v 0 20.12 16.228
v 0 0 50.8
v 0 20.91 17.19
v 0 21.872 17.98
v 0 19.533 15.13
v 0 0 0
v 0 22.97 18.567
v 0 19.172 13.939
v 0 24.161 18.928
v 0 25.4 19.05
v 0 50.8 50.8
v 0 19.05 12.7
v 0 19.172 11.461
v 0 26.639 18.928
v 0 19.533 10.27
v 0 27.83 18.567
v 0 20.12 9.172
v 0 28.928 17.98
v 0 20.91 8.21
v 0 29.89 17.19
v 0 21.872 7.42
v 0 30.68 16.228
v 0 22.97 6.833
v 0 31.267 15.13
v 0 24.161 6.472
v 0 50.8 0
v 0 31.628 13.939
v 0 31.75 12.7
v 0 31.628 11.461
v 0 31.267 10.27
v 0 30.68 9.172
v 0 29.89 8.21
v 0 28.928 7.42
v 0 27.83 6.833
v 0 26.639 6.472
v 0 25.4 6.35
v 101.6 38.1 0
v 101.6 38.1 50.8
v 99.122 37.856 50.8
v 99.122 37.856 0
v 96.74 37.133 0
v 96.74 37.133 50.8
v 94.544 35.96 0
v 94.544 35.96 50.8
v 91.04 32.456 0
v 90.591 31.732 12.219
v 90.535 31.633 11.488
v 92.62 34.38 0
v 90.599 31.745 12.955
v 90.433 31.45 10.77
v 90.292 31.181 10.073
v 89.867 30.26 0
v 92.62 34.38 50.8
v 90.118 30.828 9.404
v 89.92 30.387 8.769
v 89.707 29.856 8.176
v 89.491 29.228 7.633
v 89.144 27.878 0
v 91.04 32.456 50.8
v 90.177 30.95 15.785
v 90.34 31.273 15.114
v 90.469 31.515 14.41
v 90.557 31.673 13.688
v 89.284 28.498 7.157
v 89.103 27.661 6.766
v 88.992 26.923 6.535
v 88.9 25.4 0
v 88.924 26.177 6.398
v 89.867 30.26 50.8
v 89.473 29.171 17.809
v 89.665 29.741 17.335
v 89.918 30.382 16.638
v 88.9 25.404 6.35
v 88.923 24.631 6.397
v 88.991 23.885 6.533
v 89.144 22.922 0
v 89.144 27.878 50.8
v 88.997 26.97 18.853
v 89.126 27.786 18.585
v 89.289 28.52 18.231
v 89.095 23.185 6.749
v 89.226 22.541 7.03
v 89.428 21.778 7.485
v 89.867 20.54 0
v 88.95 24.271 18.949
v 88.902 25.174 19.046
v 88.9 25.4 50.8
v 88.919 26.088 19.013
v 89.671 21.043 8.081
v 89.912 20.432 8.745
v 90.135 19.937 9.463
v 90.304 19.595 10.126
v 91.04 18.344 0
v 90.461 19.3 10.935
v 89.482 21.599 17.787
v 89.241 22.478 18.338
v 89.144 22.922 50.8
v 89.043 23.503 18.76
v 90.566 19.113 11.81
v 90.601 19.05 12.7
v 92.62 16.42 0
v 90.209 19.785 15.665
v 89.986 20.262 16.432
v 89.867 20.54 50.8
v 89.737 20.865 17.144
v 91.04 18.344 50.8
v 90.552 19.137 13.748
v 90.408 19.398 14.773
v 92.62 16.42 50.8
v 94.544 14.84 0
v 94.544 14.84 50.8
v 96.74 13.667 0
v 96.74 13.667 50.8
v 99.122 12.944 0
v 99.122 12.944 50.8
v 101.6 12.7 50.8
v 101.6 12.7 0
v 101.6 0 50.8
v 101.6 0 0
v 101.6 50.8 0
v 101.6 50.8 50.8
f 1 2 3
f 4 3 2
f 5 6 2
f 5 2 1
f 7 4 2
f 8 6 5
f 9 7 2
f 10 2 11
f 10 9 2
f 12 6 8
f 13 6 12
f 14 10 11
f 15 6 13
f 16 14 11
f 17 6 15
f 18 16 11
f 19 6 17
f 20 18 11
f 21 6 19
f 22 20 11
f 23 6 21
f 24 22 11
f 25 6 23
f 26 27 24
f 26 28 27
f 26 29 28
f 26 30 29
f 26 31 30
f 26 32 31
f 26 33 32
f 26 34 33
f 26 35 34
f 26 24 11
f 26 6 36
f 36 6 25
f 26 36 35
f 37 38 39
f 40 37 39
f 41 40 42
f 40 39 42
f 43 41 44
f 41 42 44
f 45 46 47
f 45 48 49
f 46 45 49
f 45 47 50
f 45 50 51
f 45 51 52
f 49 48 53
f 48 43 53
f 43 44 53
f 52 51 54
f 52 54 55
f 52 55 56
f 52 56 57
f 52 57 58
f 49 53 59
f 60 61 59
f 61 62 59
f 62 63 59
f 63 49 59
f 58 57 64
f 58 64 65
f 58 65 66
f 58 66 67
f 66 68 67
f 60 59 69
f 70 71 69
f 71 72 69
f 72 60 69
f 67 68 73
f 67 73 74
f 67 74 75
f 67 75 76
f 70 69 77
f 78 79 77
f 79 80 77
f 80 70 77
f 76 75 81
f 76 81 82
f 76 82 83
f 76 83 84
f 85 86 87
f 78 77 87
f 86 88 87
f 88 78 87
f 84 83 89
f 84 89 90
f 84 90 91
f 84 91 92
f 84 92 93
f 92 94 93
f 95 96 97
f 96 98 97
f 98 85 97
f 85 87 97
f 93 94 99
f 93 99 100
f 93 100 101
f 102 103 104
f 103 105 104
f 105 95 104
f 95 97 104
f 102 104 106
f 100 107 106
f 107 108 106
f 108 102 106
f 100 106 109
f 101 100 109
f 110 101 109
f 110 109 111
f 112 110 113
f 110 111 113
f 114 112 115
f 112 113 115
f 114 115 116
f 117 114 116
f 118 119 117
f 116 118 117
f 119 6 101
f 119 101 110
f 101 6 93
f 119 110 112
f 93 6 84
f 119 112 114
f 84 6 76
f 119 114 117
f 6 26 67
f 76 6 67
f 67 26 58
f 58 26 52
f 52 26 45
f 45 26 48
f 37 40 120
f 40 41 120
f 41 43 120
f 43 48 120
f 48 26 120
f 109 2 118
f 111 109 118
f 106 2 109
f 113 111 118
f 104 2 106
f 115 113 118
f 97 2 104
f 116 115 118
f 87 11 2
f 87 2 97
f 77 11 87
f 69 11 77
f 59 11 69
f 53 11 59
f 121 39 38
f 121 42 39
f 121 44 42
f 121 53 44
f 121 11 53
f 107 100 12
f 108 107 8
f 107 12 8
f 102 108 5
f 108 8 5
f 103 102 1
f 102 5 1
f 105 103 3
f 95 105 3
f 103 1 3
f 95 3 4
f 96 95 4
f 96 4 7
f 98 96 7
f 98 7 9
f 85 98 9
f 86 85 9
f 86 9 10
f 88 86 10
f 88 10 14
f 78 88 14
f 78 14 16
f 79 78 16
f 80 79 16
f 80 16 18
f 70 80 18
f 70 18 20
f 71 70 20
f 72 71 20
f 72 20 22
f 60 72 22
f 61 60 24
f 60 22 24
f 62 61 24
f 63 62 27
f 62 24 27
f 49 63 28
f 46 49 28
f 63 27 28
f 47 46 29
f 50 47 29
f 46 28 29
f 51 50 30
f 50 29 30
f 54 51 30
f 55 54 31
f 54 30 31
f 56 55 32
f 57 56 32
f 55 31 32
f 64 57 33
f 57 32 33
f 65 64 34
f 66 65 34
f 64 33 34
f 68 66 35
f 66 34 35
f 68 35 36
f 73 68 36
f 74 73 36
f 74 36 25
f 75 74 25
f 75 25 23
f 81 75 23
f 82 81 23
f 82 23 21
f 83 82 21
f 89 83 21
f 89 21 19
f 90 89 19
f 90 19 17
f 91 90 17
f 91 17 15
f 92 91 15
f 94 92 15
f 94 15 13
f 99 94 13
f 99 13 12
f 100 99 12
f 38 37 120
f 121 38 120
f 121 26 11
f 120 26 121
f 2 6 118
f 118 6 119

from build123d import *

# Parameters (mm, degrees)
F0_W     = 101.6
F0_H     = 50.8
F1_DEPTH = 50.8
F3_DEPTH = 50.801
F4_R     = 6.35
F5_DEPTH = 101.601


with BuildPart() as f1:
    # F0 (on Top) → F1 (new body)
    with BuildSketch(Plane.XY):
        with Locations((50.8, 25.4)):
            Rectangle(F0_W, F0_H)
    extrude(amount=F1_DEPTH)

    # F2 (on face) → F3 (cut, through all)
    with BuildSketch(Plane.XY.offset(50.8)):
        with BuildLine():
            Line((101.6, 12.7), (101.6, 38.1))
            ThreePointArc((101.6, 38.1), (88.9, 25.4), (101.6, 12.7))
        make_face()
    extrude(amount=-F3_DEPTH, mode=Mode.SUBTRACT)

    # F4 (on face) → F5 (cut, through all)
    with BuildSketch(Plane(origin=(0, 0, 0), x_dir=(0, -1, 0), z_dir=(-1, 0, 0))):
        with Locations((-25.4, 12.7)):
            Circle(F4_R)
    extrude(amount=-F5_DEPTH, mode=Mode.SUBTRACT)


solid = f1.part
